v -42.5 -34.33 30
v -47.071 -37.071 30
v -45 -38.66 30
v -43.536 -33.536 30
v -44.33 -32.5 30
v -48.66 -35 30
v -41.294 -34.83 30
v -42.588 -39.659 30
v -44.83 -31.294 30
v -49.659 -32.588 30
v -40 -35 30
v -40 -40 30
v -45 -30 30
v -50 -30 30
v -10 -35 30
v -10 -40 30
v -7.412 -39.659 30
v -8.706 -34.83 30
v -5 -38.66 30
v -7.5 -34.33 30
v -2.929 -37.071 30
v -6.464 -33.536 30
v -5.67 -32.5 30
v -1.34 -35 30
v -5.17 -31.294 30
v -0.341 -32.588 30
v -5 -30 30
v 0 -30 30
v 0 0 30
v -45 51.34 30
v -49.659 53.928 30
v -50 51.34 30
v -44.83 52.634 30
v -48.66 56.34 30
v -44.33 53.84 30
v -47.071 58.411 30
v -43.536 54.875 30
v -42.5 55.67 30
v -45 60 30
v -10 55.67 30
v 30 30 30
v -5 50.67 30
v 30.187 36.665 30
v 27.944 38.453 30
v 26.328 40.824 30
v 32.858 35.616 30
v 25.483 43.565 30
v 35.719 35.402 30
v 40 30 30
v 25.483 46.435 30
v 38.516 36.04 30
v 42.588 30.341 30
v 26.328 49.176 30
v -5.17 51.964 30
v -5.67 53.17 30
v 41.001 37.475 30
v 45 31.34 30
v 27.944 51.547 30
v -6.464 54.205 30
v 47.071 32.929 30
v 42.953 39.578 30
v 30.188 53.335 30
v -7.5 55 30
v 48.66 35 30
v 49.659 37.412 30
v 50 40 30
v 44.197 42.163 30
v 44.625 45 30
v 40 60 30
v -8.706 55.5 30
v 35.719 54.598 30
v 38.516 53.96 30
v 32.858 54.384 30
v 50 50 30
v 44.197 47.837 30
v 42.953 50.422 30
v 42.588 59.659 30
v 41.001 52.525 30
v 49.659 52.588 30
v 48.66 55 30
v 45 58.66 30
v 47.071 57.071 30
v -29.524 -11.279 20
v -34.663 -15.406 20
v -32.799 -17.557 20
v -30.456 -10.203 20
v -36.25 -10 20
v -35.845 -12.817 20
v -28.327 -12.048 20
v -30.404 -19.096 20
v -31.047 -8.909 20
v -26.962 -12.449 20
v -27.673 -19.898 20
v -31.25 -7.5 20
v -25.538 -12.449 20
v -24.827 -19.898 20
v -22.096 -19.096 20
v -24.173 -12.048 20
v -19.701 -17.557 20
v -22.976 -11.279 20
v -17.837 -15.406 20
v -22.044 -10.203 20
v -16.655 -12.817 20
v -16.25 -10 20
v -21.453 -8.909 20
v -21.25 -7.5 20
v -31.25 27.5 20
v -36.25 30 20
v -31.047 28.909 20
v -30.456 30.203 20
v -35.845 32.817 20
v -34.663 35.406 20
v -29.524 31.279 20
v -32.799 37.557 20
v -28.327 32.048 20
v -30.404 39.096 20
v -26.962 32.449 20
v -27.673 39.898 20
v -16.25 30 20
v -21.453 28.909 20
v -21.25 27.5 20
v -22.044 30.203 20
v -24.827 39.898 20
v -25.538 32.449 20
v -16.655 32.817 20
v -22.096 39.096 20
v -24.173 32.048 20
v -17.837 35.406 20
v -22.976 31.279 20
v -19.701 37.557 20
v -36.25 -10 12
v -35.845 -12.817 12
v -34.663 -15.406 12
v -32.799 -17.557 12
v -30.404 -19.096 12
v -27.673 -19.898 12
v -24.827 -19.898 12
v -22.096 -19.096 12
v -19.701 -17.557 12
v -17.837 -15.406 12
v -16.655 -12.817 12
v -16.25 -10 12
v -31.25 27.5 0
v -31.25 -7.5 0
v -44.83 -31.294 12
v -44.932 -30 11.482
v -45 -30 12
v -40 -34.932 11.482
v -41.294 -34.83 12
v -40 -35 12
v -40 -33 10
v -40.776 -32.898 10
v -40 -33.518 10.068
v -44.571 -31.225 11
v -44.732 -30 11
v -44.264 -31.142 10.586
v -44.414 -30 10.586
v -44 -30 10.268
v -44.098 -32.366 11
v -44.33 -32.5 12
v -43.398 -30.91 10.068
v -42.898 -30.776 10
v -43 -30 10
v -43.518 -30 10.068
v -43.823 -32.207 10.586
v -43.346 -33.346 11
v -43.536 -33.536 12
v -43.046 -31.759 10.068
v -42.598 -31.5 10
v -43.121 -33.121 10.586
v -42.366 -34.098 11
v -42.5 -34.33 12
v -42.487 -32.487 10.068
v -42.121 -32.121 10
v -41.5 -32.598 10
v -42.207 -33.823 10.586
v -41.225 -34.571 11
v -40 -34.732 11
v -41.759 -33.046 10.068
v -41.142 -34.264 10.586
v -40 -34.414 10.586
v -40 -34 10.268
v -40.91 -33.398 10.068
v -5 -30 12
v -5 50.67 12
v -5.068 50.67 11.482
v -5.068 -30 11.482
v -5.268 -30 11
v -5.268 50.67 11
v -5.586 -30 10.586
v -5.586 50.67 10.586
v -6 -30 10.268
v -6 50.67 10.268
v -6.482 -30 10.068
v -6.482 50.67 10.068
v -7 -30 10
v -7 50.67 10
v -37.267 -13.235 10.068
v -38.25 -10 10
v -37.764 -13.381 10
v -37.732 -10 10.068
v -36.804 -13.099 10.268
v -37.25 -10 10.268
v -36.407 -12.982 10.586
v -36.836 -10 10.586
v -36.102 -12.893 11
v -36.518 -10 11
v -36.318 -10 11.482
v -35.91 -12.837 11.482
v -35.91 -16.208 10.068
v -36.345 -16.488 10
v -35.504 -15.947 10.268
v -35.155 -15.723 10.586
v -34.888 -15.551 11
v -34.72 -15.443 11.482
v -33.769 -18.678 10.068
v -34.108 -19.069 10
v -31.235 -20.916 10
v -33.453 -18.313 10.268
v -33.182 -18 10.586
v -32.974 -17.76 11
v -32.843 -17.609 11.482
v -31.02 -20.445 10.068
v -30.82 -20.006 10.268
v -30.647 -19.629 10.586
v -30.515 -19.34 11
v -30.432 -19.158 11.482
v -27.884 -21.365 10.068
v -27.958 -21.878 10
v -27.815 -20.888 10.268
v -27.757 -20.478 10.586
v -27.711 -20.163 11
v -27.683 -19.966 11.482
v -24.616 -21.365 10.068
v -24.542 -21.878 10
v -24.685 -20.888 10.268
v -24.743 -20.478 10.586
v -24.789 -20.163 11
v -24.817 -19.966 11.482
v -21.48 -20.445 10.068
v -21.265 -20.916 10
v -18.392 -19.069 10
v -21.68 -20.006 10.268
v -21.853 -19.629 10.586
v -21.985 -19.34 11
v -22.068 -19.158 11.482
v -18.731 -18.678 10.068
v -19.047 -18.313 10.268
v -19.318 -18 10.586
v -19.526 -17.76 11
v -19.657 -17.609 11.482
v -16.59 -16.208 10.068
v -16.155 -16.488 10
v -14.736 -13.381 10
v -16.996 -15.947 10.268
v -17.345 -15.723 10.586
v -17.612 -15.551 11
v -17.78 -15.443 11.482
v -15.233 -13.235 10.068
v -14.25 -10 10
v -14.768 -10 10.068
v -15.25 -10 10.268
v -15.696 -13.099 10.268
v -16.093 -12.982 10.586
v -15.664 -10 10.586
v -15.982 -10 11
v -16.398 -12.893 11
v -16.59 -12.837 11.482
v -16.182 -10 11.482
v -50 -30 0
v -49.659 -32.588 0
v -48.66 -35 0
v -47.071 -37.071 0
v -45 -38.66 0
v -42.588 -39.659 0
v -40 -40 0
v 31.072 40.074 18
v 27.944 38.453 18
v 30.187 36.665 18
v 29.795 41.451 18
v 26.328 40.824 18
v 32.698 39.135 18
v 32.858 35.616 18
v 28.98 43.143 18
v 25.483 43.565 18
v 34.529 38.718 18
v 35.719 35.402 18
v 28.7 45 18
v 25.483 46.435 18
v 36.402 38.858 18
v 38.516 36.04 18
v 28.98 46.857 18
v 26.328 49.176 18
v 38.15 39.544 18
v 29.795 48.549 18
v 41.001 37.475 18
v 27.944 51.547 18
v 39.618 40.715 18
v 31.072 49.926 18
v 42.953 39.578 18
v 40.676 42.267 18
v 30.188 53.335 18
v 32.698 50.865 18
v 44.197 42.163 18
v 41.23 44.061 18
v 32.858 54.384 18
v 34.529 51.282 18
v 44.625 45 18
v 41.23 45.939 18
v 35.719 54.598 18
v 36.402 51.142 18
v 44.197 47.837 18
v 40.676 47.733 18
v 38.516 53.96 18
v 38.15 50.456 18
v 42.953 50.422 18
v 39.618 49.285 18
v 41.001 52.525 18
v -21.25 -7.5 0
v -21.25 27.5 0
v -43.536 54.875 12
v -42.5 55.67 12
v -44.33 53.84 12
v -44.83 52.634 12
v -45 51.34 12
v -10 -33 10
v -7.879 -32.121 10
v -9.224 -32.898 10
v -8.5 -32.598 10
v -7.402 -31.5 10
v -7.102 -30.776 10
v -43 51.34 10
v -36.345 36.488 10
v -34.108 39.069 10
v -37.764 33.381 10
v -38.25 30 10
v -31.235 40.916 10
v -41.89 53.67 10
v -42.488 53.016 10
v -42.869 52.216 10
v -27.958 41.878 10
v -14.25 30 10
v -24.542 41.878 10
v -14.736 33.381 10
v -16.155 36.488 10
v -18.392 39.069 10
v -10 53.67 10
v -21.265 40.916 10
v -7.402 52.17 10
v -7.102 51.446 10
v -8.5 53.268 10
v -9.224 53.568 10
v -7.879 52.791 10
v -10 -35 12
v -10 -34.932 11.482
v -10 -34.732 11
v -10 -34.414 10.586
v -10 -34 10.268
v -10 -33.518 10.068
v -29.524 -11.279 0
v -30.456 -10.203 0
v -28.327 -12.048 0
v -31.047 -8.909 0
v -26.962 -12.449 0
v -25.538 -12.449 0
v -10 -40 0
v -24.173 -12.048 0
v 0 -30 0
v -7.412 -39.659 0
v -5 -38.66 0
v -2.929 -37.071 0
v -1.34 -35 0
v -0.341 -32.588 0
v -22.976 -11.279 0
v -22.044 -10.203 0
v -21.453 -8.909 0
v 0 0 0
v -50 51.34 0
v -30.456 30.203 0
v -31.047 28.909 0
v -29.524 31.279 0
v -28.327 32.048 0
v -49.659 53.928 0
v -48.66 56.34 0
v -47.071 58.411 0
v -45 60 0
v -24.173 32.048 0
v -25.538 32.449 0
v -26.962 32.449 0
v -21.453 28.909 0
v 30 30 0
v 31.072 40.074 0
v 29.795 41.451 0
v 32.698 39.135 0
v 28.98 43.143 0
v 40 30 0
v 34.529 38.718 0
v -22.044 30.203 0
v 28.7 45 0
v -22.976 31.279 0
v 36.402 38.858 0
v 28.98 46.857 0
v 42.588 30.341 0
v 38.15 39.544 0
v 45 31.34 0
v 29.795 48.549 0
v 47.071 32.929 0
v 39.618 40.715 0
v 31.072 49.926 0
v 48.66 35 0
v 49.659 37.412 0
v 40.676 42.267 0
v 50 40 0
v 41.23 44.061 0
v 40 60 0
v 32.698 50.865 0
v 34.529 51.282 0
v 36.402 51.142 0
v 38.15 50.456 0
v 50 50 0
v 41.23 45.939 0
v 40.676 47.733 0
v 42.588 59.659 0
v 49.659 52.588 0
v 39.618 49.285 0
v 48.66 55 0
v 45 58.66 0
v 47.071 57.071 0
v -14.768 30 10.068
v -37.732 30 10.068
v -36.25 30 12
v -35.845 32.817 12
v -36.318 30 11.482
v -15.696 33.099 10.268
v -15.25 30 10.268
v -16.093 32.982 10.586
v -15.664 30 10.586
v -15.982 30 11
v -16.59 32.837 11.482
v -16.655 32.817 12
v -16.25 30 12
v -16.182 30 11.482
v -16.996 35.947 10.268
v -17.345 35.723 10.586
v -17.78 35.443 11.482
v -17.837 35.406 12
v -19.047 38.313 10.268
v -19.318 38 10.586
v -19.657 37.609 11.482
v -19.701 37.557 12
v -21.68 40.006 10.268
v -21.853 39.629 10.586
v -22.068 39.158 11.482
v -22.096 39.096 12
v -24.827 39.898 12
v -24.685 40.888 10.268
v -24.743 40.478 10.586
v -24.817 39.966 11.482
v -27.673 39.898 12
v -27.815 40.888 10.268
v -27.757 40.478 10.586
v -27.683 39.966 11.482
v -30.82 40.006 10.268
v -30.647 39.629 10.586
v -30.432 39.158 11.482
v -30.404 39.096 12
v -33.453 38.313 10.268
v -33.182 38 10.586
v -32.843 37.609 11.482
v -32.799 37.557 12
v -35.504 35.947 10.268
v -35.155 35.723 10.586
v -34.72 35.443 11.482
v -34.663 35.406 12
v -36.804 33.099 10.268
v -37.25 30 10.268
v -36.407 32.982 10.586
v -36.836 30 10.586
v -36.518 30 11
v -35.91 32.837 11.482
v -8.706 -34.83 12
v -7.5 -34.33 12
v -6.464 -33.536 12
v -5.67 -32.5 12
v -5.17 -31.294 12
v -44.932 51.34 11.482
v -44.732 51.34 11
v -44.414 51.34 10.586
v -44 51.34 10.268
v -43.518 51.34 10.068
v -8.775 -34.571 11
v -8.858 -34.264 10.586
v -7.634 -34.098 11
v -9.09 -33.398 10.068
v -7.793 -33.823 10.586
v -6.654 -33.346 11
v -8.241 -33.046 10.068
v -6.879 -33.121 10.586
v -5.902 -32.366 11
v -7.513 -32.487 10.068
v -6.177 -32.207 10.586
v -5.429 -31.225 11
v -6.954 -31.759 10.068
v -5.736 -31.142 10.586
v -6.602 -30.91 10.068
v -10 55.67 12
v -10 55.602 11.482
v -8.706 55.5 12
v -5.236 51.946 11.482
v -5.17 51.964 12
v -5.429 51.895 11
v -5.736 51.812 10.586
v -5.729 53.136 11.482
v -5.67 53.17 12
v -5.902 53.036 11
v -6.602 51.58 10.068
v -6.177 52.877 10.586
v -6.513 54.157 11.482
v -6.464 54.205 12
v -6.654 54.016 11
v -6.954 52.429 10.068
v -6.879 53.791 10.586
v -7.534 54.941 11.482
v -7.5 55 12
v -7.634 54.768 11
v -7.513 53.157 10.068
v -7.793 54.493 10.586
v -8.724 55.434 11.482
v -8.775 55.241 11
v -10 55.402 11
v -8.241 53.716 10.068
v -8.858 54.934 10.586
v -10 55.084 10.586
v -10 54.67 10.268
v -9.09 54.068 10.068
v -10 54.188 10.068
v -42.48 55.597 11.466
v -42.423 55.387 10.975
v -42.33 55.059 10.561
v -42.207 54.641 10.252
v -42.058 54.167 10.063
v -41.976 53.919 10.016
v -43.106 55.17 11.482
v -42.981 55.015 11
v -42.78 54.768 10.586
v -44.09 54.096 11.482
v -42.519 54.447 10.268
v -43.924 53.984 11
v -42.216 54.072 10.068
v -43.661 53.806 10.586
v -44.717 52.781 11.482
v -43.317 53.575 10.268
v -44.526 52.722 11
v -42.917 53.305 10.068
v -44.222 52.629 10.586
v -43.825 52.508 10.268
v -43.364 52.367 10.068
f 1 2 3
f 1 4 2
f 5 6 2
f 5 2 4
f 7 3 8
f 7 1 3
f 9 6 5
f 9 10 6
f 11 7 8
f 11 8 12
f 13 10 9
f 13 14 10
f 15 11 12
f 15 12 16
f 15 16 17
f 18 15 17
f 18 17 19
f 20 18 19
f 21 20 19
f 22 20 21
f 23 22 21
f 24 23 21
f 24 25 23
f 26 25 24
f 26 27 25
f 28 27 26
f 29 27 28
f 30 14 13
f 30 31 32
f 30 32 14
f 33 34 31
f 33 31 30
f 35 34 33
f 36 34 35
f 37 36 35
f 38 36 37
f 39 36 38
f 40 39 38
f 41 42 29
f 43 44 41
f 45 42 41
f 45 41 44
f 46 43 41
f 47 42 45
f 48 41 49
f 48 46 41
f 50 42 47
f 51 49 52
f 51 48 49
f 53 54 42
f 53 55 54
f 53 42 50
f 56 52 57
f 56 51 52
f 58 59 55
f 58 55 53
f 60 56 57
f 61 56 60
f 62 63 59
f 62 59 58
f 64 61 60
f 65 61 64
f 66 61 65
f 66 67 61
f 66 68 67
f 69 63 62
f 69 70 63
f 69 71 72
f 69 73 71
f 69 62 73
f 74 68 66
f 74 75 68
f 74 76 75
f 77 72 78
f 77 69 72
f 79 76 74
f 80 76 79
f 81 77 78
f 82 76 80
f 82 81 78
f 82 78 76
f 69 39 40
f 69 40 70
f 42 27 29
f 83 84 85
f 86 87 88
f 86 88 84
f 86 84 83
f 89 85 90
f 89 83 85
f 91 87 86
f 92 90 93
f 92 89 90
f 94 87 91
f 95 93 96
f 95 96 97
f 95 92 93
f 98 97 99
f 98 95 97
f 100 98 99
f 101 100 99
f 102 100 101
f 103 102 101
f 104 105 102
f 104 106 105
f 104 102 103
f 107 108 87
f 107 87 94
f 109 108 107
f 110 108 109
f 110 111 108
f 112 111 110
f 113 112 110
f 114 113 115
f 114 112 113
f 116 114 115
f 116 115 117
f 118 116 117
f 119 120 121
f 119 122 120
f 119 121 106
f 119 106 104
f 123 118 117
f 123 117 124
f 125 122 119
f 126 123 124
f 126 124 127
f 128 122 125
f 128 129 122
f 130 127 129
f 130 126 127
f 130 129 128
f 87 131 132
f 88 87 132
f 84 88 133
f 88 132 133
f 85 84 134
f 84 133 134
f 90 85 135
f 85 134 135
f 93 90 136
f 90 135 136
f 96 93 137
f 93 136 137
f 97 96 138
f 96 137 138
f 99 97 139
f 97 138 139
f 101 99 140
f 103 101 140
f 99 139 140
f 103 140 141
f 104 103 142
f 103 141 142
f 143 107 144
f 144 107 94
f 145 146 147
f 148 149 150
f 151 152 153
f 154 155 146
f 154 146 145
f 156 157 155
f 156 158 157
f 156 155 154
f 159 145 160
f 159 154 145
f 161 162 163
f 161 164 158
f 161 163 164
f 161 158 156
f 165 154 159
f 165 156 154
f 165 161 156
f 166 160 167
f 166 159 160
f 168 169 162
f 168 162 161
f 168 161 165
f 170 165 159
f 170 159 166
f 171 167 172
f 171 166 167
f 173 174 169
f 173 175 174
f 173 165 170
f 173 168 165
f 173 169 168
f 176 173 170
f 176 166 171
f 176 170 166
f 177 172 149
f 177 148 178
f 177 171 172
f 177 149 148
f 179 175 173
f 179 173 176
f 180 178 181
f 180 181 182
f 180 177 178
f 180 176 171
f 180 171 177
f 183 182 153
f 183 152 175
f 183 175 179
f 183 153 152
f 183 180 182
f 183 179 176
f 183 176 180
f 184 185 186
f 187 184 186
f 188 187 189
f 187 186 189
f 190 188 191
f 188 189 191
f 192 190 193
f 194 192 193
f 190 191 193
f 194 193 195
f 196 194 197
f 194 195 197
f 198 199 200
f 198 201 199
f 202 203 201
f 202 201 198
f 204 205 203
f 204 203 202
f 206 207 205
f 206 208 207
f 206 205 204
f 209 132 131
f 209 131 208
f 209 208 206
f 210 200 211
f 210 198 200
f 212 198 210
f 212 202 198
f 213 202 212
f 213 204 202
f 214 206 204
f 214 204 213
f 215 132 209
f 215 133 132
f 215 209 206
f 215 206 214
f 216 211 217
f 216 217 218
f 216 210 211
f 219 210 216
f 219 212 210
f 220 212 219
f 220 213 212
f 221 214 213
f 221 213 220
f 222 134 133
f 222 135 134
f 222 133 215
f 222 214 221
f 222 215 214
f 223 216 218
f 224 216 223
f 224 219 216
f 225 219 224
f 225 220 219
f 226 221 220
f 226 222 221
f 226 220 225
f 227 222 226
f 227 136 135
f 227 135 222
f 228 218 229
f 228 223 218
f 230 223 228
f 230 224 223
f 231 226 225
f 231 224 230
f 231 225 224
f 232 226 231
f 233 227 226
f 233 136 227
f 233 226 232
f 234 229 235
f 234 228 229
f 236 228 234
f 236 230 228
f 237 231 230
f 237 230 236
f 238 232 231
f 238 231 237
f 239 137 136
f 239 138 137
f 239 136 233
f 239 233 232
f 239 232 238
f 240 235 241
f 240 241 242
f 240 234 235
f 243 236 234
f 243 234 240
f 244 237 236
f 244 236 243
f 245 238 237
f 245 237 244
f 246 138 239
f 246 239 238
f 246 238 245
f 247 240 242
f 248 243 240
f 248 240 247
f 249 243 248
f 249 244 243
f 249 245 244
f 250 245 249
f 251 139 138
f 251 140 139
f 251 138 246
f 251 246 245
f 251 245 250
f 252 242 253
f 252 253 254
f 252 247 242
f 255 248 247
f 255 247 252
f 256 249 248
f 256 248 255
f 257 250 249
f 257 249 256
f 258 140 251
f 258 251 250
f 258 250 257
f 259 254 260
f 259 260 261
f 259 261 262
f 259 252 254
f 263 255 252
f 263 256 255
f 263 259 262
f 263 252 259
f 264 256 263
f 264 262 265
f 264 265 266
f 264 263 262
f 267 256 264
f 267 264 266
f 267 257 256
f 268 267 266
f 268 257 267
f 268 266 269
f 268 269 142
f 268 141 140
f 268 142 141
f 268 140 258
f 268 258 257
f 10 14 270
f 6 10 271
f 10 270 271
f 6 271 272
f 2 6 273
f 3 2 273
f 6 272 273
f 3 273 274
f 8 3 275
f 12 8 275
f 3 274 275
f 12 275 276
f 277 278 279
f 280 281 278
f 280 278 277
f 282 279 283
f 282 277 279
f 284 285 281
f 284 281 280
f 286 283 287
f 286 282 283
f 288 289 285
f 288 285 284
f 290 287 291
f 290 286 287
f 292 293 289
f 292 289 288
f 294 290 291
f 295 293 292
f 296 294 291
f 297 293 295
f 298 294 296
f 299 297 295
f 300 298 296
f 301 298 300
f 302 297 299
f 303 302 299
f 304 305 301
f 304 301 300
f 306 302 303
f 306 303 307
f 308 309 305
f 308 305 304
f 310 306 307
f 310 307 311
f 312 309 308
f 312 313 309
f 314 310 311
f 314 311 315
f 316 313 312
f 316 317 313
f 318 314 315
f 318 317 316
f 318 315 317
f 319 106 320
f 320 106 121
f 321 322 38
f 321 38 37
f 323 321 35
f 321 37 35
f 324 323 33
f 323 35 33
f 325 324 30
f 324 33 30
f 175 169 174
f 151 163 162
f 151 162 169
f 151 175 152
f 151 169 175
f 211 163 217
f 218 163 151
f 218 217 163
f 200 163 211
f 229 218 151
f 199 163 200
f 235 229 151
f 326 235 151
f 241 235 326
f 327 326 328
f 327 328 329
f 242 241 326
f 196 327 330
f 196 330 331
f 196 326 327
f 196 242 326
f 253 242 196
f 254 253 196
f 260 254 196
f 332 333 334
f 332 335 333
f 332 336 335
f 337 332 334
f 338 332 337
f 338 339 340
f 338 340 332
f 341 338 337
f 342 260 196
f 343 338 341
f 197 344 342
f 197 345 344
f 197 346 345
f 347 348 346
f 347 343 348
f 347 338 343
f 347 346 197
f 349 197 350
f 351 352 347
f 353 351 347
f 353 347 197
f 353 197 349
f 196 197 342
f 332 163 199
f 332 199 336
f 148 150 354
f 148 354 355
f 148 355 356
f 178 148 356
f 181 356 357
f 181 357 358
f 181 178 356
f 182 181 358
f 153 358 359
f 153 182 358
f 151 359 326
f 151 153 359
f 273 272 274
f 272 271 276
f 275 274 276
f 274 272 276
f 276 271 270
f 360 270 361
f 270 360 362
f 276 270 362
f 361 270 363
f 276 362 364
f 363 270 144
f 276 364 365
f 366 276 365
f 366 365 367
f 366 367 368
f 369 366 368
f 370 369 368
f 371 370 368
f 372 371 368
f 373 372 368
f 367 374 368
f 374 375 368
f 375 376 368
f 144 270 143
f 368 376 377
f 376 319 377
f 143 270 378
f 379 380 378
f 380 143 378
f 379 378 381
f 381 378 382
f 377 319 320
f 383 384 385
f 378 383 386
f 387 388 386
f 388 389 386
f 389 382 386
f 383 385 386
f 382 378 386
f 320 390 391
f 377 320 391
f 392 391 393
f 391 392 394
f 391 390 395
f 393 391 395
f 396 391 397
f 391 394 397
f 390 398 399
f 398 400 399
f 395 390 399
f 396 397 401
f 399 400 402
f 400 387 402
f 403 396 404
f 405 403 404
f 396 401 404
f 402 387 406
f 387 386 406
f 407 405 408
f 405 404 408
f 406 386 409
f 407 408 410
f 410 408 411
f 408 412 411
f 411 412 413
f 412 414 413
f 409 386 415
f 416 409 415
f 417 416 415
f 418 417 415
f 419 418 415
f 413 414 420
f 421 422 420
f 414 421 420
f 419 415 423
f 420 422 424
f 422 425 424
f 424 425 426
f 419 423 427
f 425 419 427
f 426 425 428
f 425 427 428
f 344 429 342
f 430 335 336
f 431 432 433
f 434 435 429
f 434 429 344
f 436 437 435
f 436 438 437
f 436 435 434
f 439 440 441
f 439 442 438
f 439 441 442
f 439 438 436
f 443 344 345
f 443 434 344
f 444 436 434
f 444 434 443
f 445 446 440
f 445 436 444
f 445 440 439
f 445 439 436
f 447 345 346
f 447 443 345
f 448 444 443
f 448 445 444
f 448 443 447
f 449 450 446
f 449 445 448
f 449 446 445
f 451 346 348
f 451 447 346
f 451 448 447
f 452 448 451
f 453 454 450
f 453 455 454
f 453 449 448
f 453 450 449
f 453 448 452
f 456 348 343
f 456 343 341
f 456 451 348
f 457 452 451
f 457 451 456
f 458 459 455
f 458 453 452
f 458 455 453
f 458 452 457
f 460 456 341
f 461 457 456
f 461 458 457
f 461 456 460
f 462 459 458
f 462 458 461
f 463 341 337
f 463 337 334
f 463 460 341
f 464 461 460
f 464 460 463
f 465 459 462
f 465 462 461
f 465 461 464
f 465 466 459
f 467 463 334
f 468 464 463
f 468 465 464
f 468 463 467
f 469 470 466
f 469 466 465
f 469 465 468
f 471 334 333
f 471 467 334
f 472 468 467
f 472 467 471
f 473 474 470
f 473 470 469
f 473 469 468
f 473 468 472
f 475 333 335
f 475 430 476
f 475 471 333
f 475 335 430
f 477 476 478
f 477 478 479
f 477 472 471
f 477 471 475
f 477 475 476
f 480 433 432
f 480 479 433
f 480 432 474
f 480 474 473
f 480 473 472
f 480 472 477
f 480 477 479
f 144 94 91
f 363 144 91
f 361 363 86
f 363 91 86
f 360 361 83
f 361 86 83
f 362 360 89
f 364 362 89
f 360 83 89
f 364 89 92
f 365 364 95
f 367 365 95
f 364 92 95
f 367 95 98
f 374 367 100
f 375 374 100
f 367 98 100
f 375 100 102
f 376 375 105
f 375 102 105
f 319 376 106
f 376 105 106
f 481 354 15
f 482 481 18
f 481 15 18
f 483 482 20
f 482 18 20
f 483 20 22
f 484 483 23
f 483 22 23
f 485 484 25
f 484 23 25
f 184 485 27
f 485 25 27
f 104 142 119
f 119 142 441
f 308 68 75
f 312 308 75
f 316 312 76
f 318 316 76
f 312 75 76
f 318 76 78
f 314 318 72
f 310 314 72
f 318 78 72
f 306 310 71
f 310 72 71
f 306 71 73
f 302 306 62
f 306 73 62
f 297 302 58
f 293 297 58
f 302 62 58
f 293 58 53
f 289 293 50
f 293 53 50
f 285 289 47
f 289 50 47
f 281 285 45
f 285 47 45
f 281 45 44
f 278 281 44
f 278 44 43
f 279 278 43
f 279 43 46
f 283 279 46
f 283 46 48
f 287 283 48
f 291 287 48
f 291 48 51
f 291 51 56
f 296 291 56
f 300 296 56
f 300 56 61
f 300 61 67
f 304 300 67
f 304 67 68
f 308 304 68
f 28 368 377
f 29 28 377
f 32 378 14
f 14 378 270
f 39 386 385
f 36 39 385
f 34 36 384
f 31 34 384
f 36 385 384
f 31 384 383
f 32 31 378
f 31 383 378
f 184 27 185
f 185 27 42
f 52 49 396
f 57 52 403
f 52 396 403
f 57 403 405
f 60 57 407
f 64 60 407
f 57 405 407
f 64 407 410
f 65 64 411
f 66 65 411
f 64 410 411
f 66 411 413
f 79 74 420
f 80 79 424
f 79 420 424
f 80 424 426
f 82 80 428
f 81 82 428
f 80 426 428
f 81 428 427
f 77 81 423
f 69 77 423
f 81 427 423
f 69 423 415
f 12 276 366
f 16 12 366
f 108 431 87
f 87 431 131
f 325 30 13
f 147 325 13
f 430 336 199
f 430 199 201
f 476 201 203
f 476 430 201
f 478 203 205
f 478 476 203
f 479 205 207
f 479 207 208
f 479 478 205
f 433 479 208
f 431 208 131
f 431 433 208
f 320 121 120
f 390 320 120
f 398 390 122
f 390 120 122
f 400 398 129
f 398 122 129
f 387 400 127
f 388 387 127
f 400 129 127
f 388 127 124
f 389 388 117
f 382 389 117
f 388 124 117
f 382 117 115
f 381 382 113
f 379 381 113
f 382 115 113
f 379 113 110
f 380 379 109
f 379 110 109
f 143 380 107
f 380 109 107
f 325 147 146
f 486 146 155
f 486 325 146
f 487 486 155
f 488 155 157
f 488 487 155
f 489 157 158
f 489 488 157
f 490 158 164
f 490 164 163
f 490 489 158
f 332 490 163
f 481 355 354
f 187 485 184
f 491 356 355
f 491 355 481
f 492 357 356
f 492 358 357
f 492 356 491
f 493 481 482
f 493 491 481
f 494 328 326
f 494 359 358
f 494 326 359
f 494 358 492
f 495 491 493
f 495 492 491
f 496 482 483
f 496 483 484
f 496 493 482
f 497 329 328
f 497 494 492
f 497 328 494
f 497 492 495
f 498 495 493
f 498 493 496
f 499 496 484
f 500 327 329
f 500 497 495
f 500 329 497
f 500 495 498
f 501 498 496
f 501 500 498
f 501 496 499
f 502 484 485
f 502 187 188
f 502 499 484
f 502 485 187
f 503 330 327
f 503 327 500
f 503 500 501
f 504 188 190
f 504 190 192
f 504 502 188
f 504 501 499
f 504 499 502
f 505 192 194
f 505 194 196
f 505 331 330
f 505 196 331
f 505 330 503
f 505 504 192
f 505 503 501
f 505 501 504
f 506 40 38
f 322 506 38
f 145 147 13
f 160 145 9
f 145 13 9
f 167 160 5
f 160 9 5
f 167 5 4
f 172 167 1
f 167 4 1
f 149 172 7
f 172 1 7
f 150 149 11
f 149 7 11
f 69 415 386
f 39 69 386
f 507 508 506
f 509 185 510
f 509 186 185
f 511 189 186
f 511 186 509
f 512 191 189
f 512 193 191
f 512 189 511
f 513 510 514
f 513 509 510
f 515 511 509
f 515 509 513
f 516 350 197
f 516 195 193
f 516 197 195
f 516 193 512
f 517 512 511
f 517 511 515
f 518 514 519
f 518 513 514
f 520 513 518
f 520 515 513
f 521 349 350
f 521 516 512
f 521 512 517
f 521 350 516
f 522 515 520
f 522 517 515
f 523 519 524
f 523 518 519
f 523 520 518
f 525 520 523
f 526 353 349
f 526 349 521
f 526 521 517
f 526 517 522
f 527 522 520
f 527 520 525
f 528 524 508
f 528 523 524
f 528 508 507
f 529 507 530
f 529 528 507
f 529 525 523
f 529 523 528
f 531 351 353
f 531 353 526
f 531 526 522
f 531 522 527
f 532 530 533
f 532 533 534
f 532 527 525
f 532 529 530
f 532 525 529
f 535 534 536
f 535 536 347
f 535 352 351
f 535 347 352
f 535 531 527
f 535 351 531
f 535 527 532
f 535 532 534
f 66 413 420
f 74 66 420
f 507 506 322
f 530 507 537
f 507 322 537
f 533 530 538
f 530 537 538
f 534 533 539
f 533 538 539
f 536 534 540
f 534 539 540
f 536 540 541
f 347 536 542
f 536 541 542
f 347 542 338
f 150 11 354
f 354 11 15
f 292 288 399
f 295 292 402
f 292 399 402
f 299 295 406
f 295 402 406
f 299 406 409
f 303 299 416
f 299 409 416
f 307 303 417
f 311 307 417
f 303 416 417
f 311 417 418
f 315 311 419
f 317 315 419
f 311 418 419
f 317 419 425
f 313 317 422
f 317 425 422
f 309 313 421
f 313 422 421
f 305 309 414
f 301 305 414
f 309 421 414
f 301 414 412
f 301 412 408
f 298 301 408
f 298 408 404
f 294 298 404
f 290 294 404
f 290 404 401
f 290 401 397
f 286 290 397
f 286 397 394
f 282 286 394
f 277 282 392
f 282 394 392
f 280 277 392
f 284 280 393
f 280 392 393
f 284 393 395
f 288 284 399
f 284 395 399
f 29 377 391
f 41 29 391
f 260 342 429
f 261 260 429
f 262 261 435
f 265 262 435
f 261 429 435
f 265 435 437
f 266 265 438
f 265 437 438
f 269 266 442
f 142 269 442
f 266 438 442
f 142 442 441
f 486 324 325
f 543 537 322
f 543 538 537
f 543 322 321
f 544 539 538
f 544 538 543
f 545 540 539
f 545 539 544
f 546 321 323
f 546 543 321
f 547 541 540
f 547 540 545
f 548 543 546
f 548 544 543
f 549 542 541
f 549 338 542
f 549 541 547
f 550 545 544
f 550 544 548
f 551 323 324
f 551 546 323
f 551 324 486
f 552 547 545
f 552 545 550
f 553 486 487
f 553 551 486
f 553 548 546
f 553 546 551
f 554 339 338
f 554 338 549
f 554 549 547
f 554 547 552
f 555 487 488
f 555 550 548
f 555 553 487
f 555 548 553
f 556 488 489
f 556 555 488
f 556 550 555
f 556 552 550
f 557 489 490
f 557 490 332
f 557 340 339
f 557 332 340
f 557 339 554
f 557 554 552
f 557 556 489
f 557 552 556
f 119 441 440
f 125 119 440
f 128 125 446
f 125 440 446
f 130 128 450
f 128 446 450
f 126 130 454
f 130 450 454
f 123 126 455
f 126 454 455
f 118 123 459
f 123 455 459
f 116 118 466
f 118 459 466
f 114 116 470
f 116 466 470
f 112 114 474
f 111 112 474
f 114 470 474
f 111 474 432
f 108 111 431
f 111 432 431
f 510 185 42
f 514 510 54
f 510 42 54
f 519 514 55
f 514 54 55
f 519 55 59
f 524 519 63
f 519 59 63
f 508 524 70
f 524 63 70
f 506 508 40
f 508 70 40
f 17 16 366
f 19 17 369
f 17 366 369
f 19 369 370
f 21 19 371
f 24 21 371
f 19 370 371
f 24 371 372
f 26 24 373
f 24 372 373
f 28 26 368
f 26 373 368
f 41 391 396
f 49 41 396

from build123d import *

# Parameters (mm, degrees)
F1_DEPTH       = 30
F3_D           = 12.6
F3_CBORE_D     = 19.25
F3_CBORE_DEPTH = 12
F5_DEPTH       = 20
F7_DEPTH       = 10
F9_T1_DEPTH    = 80.6698729811
F9_T3_DEPTH    = 37.5
F9_T5_DEPTH    = 30
F9_T7_DEPTH    = 81.3397459622
F9_T9_DEPTH    = 40
F9_T12_ANGLE   = 90
F9_T14_ANGLE   = 90
F9_T16_ANGLE   = 117.3060073295
F9_T18_ANGLE   = 90
F9_T20_ANGLE   = 180
F9_T22_ANGLE   = 180
F10_DEPTH      = 20.001


# Not quite as in the source:
# - a fillet or chamfer that OpenCascade refuses, or shapes differently, is made with other operations: its cross-section is extruded or revolved along the edge and cut away or added


with BuildPart() as f1:
    # F0 (on Top) → F1 (new body)
    with BuildSketch(Plane.XY):
        with BuildLine():
            Line((0, -30), (0, 0))
            Line((0, 0), (30, 30))
            Line((30, 30), (40, 30))
            ThreePointArc((40, 30), (47.0710678119, 32.9289321881), (50, 40))
            Line((50, 40), (50, 50))
            ThreePointArc((50, 50), (47.0710678119, 57.0710678119), (40, 60))
            Line((40, 60), (-45, 60))
            ThreePointArc((-45, 60), (-48.6602540378, 56.3397459622), (-50, 51.3397459622))
            Line((-50, 51.3397459622), (-50, -30))
            ThreePointArc((-50, -30), (-47.0710678119, -37.0710678119), (-40, -40))
            Line((-40, -40), (-10, -40))
            ThreePointArc((-10, -40), (-2.9289321881, -37.0710678119), (0, -30))
        make_face()
    extrude(amount=F1_DEPTH)

    # F3 (through all)
    with Locations(Plane.XY.offset(30)):
        with Locations((35, 45)):
            CounterBoreHole(F3_D / 2, F3_CBORE_D / 2, F3_CBORE_DEPTH)

    # F4 (on face) → F5 (cut)
    with BuildSketch(Plane.XY.offset(30)):
        with BuildLine():
            Line((-10, 55.6698729811), (-42.5, 55.6698729811))
            ThreePointArc((-42.5, 55.6698729811), (-44.3301270189, 53.8397459622), (-45, 51.3397459622))
            Line((-45, 51.3397459622), (-45, -30))
            ThreePointArc((-45, -30), (-43.5355339059, -33.5355339059), (-40, -35))
            Line((-40, -35), (-10, -35))
            ThreePointArc((-10, -35), (-6.4644660941, -33.5355339059), (-5, -30))
            Line((-5, -30), (-5, 50.6698729811))
            ThreePointArc((-5, 50.6698729811), (-6.4644660941, 54.205406887), (-10, 55.6698729811))
        make_face()
    extrude(amount=-F5_DEPTH, mode=Mode.SUBTRACT)

    # F6 (on face) → F7 (join)
    with BuildSketch(Plane.XY.offset(10)):
        with BuildLine():
            ThreePointArc((-16.25, 30), (-26.25, 40), (-36.25, 30))
            Line((-36.25, 30), (-36.25, -10))
            ThreePointArc((-36.25, -10), (-26.25, -20), (-16.25, -10))
            Line((-16.25, -10), (-16.25, 30))
        make_face()
    extrude(amount=F7_DEPTH)

    # F9: fillet of radius 2 on 12 edges, made by hand

    # F9_s2 → F9_t1 (join)
    with BuildSketch(Plane.XZ.offset(-50.6698729811)):
        with BuildLine():
            ThreePointArc((-5, 12), (-5.5857864376, 10.5857864376), (-7, 10))
            Line((-7, 10), (-5, 10))
            Line((-5, 10), (-5, 12))
        make_face()
    extrude(amount=F9_T1_DEPTH)

    # F9_s4 → F9_t3 (join)
    with BuildSketch(Plane.YZ.offset(-47.5)):
        with BuildLine():
            ThreePointArc((55.6698729811, 12), (55.0840865435, 10.5857864376), (53.6698729811, 10))
            Line((53.6698729811, 10), (55.6698729811, 10))
            Line((55.6698729811, 10), (55.6698729811, 12))
        make_face()
    extrude(amount=F9_T3_DEPTH)

    # F9_s6 → F9_t5 (join)
    with BuildSketch(Plane.YZ.offset(-40)):
        with BuildLine():
            ThreePointArc((-35, 12), (-34.4142135624, 10.5857864376), (-33, 10))
            Line((-33, 10), (-35, 10))
            Line((-35, 10), (-35, 12))
        make_face()
    extrude(amount=F9_T5_DEPTH)

    # F9_s8 → F9_t7 (join)
    with BuildSketch(Plane.XZ.offset(-51.3397459622)):
        with BuildLine():
            ThreePointArc((-45, 12), (-44.4142135624, 10.5857864376), (-43, 10))
            Line((-43, 10), (-45, 10))
            Line((-45, 10), (-45, 12))
        make_face()
    extrude(amount=F9_T7_DEPTH)

    # F9_s10 → F9_t9 (join)
    with BuildSketch(Plane.XZ.offset(-30)):
        with BuildLine():
            ThreePointArc((-14.25, 10), (-15.6642135624, 10.5857864376), (-16.25, 12))
            Line((-16.25, 12), (-16.25, 10))
            Line((-16.25, 10), (-14.25, 10))
        make_face()
        with BuildLine():
            ThreePointArc((-38.25, 10), (-36.8357864376, 10.5857864376), (-36.25, 12))
            Line((-36.25, 12), (-36.25, 10))
            Line((-36.25, 10), (-38.25, 10))
        make_face()
    extrude(amount=F9_T9_DEPTH)

    # F9_s11 → F9_t12 (revolve)
    with BuildSketch(Plane.XZ.offset(-50.6698729811)):
        with BuildLine():
            ThreePointArc((-5, 12), (-5.5857864376, 10.5857864376), (-7, 10))
            Line((-7, 10), (-5, 10))
            Line((-5, 10), (-5, 12))
        make_face()
    revolve(axis=Axis((-10, 50.6698729811, 10), (0, 0, 1)), revolution_arc=F9_T12_ANGLE)

    # F9_s13 → F9_t14 (revolve)
    with BuildSketch(Plane.YZ.offset(-10)):
        with BuildLine():
            ThreePointArc((-35, 12), (-34.4142135624, 10.5857864376), (-33, 10))
            Line((-33, 10), (-35, 10))
            Line((-35, 10), (-35, 12))
        make_face()
    revolve(axis=Axis((-10, -30, 10), (0, 0, 1)), revolution_arc=F9_T14_ANGLE)

    # F9_s15 → F9_t16 (revolve)
    with BuildSketch(Plane(origin=(-52.509549327, 27.1091719145, 0), x_dir=(0, 0, 1), z_dir=(0.8885691394, -0.4587427214, 0))):
        with BuildLine():
            ThreePointArc((12, -32.2692050314), (10.5857864376, -31.6834185938), (10, -30.2692050314))
            Line((10, -30.2692050314), (10, -32.2692050314))
            Line((10, -32.2692050314), (12, -32.2692050314))
        make_face()
    revolve(axis=Axis((-40, 51.3397459622, 10), (0, 0, 1)), revolution_arc=F9_T16_ANGLE)

    # F9_s17 → F9_t18 (revolve)
    with BuildSketch(Plane.XZ.offset(30)):
        with BuildLine():
            ThreePointArc((-45, 12), (-44.4142135624, 10.5857864376), (-43, 10))
            Line((-43, 10), (-45, 10))
            Line((-45, 10), (-45, 12))
        make_face()
    revolve(axis=Axis((-40, -30, 10), (0, 0, 1)), revolution_arc=F9_T18_ANGLE)

    # F9_s19 → F9_t20 (revolve)
    with BuildSketch(Plane.XZ.offset(10)):
        with BuildLine():
            ThreePointArc((-38.25, 10), (-36.8357864376, 10.5857864376), (-36.25, 12))
            Line((-36.25, 12), (-36.25, 10))
            Line((-36.25, 10), (-38.25, 10))
        make_face()
    revolve(axis=Axis((-26.25, -10, 10), (0, 0, 1)), revolution_arc=F9_T20_ANGLE)

    # F9_s21 → F9_t22 (revolve)
    with BuildSketch(Plane.XZ.offset(-30)):
        with BuildLine():
            ThreePointArc((-14.25, 10), (-15.6642135624, 10.5857864376), (-16.25, 12))
            Line((-16.25, 12), (-16.25, 10))
            Line((-16.25, 10), (-14.25, 10))
        make_face()
    revolve(axis=Axis((-26.25, 30, 10), (0, 0, 1)), revolution_arc=F9_T22_ANGLE)

    # F8 (on face) → F10 (cut, through all)
    with BuildSketch(Plane.XY.offset(20)):
        with BuildLine():
            ThreePointArc((-31.25, -7.5), (-26.25, -12.5), (-21.25, -7.5))
            Line((-21.25, -7.5), (-21.25, 27.5))
            ThreePointArc((-21.25, 27.5), (-26.25, 32.5), (-31.25, 27.5))
            Line((-31.25, 27.5), (-31.25, -7.5))
        make_face()
    extrude(amount=-F10_DEPTH, mode=Mode.SUBTRACT)


solid = f1.part
